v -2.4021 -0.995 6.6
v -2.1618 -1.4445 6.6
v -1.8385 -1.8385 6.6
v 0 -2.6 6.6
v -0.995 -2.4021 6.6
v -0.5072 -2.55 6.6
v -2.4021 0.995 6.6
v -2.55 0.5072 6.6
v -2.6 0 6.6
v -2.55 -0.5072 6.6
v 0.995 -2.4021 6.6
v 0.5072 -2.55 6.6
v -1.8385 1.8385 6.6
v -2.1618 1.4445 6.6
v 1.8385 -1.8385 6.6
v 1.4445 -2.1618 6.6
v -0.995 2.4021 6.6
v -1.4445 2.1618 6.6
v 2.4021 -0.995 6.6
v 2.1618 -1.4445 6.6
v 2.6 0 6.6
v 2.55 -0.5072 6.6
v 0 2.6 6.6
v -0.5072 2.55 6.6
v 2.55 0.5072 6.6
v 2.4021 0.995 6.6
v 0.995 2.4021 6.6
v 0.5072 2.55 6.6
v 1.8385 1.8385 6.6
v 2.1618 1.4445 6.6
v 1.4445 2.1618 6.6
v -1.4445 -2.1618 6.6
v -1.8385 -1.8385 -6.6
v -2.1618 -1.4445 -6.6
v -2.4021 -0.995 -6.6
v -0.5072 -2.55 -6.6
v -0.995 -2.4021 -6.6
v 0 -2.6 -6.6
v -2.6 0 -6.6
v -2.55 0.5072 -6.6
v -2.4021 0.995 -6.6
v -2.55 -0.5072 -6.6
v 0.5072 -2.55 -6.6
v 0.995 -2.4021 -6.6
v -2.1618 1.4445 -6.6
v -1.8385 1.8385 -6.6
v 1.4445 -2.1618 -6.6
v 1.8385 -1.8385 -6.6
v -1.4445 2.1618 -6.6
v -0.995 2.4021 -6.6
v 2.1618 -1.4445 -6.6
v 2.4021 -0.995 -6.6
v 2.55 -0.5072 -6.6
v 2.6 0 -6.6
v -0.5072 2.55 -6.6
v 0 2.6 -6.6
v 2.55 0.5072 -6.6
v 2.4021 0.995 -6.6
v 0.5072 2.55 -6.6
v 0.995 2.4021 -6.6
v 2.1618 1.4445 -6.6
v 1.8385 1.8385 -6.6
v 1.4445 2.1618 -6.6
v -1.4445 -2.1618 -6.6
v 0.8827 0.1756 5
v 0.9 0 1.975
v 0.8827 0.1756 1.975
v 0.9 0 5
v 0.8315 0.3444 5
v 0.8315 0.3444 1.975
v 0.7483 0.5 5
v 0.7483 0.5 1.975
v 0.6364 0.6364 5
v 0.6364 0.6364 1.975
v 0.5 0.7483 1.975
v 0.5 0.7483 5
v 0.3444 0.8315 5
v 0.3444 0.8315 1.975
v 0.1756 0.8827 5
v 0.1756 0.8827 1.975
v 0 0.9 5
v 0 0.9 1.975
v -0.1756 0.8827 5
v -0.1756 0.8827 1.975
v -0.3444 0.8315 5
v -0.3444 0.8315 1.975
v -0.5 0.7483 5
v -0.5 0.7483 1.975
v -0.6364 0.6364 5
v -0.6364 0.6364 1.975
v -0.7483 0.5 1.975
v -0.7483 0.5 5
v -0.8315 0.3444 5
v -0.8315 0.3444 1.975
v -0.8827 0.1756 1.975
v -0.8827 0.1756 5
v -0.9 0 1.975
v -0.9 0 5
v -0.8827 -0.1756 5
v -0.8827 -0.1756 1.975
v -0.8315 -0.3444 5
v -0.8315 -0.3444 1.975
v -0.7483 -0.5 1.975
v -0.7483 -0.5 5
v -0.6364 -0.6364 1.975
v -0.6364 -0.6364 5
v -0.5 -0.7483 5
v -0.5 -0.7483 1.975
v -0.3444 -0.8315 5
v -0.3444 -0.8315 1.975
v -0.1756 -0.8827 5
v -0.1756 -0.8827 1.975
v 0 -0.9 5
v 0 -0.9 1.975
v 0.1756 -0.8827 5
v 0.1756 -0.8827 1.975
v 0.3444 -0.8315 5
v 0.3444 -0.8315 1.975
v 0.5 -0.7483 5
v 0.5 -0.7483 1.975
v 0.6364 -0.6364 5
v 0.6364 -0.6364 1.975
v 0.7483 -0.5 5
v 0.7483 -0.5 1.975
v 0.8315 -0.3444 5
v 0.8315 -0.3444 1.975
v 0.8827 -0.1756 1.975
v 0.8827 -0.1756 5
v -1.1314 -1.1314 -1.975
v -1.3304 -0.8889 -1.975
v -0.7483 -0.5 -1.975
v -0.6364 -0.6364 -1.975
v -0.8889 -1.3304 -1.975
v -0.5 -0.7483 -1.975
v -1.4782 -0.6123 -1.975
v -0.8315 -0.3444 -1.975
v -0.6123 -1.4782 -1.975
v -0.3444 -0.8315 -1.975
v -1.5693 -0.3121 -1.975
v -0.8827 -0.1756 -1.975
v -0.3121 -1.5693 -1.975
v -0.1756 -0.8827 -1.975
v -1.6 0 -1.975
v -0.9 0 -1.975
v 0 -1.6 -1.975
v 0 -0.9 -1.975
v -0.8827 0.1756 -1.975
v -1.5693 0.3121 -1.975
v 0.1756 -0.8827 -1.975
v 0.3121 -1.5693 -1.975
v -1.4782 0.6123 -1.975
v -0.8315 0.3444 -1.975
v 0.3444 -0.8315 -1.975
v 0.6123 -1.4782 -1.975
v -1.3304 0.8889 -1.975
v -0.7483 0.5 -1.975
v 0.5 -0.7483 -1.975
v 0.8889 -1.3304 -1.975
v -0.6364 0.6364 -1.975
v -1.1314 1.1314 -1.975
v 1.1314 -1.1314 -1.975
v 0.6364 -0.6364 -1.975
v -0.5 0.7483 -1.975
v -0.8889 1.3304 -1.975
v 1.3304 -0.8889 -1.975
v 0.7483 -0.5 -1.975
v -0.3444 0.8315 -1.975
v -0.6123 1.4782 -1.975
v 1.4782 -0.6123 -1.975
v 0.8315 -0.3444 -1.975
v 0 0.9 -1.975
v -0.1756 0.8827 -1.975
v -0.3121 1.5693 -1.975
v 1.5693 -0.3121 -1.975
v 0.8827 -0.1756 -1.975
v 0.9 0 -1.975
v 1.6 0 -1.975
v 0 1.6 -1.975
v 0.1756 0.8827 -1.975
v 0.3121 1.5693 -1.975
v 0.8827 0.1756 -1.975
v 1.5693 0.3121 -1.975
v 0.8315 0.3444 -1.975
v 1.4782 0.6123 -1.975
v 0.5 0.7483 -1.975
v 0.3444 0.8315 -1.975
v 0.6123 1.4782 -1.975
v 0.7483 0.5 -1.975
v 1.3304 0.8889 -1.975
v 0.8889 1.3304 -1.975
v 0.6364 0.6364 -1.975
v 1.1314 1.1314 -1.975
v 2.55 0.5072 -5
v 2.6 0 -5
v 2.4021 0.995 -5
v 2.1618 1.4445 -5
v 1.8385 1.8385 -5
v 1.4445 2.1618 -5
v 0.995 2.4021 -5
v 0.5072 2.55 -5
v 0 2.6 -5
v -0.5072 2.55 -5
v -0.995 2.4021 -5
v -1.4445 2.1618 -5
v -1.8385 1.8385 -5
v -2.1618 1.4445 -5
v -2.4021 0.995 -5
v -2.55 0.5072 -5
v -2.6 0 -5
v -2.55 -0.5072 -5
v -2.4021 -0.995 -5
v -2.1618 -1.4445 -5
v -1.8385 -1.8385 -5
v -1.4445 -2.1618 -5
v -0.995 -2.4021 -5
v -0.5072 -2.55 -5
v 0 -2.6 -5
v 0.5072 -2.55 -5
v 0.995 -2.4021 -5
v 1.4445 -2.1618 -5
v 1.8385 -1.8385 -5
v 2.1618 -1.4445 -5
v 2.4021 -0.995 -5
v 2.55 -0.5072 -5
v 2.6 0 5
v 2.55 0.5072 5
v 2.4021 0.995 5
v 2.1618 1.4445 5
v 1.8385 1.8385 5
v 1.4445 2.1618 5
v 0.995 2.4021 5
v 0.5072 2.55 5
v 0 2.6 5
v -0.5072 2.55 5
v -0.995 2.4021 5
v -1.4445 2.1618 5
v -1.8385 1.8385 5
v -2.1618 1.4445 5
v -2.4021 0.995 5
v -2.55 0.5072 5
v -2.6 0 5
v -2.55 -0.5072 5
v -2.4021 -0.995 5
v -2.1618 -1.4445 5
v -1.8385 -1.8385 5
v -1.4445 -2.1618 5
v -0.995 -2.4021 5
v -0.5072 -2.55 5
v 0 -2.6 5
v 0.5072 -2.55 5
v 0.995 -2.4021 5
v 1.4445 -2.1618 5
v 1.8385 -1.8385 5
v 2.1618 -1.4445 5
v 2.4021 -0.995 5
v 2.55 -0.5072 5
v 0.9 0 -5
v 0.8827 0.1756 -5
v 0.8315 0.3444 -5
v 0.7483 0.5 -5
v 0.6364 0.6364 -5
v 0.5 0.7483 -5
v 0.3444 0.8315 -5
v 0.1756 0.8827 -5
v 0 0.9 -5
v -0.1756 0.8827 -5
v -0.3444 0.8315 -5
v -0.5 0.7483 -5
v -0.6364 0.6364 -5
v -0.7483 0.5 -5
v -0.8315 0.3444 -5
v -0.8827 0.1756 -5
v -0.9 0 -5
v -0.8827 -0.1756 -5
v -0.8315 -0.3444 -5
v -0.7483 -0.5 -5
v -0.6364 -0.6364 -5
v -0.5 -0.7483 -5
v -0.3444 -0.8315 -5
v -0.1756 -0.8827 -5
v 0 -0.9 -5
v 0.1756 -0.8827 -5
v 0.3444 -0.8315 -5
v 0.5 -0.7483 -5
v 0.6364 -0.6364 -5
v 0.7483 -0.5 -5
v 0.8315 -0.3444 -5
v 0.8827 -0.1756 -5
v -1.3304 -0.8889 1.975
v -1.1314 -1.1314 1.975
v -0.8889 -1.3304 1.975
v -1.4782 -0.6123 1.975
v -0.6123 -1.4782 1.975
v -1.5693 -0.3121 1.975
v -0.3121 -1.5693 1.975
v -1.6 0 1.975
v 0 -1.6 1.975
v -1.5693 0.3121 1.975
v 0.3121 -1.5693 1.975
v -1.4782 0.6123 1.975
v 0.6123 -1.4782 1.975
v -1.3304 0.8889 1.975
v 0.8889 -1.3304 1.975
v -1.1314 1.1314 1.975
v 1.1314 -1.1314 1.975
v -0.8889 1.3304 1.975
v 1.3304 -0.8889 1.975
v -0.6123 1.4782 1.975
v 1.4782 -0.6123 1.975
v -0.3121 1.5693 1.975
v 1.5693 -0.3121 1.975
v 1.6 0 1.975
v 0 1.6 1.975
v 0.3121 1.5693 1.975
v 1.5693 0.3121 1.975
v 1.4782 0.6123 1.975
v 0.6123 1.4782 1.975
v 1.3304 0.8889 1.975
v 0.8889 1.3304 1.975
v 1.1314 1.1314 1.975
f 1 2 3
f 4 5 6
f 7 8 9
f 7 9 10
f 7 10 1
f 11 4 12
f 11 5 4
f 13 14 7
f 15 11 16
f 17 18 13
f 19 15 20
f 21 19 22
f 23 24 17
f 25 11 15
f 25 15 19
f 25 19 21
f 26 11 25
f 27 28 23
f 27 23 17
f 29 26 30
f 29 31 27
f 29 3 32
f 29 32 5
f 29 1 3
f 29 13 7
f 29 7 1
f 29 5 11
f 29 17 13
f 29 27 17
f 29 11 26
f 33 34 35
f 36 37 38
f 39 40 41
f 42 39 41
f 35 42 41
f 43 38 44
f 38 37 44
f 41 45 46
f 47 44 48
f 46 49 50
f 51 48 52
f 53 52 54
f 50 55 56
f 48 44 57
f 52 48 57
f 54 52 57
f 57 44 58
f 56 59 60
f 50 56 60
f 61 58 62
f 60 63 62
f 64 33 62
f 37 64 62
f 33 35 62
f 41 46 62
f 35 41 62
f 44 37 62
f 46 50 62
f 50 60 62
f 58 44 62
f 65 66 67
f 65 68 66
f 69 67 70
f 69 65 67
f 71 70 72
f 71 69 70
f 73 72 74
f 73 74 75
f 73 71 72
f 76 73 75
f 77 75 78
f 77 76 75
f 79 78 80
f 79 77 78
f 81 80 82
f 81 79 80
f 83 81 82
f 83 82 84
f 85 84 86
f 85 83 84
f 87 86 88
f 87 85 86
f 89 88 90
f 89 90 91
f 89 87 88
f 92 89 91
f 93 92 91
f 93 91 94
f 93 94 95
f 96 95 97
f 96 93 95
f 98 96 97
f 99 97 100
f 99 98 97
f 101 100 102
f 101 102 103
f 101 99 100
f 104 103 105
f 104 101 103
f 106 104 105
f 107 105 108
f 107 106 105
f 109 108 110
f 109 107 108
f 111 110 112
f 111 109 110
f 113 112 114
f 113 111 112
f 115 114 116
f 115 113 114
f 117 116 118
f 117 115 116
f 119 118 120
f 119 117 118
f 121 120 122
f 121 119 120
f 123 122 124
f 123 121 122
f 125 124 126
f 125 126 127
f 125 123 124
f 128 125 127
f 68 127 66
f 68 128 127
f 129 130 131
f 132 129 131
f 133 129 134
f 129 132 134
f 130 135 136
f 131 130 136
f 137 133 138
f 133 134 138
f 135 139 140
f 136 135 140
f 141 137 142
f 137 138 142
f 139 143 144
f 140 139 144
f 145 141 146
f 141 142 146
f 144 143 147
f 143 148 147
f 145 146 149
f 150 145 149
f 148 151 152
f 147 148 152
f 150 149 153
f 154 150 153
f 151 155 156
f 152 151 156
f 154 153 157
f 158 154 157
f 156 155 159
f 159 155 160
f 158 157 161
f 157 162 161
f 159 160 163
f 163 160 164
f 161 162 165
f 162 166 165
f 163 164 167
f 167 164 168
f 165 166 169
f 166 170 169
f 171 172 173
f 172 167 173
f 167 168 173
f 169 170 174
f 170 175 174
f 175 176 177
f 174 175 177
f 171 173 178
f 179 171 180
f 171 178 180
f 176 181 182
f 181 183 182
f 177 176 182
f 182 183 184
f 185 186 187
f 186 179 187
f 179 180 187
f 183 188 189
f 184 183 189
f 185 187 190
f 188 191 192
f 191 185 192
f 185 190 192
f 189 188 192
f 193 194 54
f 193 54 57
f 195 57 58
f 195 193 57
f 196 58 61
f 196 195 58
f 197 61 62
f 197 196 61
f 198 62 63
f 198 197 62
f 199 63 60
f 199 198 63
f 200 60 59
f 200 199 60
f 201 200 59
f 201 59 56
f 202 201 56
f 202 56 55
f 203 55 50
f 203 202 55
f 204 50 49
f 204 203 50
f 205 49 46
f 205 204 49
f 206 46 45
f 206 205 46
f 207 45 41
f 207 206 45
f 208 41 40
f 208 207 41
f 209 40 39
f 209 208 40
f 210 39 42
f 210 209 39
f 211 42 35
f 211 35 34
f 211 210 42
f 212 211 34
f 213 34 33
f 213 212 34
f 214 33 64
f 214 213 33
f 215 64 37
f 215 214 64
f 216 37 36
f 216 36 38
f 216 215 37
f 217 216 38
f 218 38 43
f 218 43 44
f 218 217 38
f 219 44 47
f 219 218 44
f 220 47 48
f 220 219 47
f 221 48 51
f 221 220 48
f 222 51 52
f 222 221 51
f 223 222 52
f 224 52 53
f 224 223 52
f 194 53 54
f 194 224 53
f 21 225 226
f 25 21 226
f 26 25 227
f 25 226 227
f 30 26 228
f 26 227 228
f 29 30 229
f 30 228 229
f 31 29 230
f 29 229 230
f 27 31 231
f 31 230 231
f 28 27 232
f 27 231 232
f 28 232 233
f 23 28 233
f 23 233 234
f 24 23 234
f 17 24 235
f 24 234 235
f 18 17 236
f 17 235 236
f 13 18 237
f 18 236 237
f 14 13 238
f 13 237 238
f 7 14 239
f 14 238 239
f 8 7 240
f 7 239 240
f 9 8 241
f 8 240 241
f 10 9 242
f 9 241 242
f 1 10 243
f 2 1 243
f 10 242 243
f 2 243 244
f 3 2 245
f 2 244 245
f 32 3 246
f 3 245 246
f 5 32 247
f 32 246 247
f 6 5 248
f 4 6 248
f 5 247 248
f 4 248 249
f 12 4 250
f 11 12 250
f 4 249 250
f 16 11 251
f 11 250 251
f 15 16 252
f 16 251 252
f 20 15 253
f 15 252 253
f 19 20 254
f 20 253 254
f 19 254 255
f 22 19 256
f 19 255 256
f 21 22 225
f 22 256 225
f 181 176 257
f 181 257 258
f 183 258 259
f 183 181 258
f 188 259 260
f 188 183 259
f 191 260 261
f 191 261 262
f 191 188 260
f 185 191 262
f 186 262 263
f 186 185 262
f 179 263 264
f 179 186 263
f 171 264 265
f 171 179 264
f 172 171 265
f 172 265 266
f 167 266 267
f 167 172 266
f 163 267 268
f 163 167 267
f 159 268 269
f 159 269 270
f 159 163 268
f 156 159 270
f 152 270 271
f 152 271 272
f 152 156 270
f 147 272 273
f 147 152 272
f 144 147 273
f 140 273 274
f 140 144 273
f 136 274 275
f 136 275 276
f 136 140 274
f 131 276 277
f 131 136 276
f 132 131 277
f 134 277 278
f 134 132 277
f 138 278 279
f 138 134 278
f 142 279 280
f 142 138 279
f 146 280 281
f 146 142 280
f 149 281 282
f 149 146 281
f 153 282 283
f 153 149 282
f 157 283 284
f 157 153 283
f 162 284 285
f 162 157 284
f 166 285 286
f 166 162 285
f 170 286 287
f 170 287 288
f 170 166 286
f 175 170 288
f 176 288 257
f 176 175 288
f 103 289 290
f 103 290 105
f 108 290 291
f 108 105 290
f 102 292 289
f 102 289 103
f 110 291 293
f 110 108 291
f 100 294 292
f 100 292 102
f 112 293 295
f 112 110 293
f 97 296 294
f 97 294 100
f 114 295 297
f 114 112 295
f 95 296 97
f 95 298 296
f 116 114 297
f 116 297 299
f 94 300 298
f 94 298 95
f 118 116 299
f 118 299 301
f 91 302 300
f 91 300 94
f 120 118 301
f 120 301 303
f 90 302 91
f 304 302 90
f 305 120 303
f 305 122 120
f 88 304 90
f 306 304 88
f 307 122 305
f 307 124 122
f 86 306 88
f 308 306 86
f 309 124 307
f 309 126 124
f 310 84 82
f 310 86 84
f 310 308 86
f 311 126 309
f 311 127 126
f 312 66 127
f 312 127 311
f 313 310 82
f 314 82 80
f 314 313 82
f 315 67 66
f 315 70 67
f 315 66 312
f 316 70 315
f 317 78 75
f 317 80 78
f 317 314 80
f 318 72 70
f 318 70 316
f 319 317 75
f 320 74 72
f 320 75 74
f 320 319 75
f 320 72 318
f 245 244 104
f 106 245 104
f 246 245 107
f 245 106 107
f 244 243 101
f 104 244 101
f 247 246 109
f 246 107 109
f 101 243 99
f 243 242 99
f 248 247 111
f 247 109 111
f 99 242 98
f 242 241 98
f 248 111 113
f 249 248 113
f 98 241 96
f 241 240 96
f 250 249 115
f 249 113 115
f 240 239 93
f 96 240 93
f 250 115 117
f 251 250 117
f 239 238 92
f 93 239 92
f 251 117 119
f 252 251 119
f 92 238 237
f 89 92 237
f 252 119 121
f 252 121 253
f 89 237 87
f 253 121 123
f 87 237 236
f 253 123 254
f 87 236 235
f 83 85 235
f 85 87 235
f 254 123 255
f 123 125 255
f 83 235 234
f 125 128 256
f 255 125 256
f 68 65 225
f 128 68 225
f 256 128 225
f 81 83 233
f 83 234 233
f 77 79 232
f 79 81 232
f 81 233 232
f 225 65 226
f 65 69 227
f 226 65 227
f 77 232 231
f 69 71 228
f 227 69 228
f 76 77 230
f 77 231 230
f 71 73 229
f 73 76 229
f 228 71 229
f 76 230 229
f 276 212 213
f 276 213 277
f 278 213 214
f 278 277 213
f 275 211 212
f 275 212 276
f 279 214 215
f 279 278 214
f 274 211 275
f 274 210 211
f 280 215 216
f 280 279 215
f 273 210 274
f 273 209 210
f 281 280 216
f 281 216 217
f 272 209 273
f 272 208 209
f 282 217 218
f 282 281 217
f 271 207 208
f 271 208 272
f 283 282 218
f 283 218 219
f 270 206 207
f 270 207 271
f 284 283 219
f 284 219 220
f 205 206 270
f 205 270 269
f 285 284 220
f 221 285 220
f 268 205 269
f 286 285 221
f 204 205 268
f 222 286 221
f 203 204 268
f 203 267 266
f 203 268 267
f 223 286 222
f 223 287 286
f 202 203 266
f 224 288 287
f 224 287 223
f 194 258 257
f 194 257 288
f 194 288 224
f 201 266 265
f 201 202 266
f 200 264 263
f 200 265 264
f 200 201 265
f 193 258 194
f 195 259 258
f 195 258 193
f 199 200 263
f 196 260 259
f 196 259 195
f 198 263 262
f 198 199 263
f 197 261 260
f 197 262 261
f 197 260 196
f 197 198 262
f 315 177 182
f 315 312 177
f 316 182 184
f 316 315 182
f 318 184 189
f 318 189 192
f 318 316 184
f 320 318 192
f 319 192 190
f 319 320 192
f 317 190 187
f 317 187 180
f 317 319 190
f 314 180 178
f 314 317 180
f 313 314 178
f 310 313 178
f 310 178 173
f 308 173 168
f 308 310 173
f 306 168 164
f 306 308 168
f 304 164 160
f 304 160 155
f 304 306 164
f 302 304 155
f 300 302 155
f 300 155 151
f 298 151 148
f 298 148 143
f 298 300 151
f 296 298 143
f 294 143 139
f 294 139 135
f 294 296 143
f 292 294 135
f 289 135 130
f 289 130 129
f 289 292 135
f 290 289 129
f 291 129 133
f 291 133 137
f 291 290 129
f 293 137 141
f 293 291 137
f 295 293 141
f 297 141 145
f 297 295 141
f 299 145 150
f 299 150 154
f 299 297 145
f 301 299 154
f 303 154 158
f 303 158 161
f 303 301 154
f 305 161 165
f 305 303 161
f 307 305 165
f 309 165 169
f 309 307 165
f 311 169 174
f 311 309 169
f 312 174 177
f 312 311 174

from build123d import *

# Parameters (mm, degrees)
SKETCH1_R           = 0.9
BOSS_EXTRUDE1_DEPTH = 5
SKETCH2_R           = 1.6
BOSS_EXTRUDE2_DEPTH = 1.975
SKETCH3_R           = 2.6
BOSS_EXTRUDE3_DEPTH = 1.6


with BuildPart() as part:
    # Sketch1 → Boss-Extrude1 (new, symmetric)
    with BuildSketch(Plane.XY):
        Circle(SKETCH1_R)
    extrude(amount=BOSS_EXTRUDE1_DEPTH, both=True)

    # Sketch2 → Boss-Extrude2 (add, symmetric)
    with BuildSketch(Plane.XY):
        Circle(SKETCH2_R)
    extrude(amount=BOSS_EXTRUDE2_DEPTH, both=True)

    # Sketch3 → Boss-Extrude3 (add)
    with BuildSketch(Plane.XY.offset(5)):
        Circle(SKETCH3_R)
    boss_extrude3 = extrude(amount=BOSS_EXTRUDE3_DEPTH)

    # Mirror1: Boss-Extrude3 across plane
    add(boss_extrude3.mirror(Plane.XY))


solid = part.part
